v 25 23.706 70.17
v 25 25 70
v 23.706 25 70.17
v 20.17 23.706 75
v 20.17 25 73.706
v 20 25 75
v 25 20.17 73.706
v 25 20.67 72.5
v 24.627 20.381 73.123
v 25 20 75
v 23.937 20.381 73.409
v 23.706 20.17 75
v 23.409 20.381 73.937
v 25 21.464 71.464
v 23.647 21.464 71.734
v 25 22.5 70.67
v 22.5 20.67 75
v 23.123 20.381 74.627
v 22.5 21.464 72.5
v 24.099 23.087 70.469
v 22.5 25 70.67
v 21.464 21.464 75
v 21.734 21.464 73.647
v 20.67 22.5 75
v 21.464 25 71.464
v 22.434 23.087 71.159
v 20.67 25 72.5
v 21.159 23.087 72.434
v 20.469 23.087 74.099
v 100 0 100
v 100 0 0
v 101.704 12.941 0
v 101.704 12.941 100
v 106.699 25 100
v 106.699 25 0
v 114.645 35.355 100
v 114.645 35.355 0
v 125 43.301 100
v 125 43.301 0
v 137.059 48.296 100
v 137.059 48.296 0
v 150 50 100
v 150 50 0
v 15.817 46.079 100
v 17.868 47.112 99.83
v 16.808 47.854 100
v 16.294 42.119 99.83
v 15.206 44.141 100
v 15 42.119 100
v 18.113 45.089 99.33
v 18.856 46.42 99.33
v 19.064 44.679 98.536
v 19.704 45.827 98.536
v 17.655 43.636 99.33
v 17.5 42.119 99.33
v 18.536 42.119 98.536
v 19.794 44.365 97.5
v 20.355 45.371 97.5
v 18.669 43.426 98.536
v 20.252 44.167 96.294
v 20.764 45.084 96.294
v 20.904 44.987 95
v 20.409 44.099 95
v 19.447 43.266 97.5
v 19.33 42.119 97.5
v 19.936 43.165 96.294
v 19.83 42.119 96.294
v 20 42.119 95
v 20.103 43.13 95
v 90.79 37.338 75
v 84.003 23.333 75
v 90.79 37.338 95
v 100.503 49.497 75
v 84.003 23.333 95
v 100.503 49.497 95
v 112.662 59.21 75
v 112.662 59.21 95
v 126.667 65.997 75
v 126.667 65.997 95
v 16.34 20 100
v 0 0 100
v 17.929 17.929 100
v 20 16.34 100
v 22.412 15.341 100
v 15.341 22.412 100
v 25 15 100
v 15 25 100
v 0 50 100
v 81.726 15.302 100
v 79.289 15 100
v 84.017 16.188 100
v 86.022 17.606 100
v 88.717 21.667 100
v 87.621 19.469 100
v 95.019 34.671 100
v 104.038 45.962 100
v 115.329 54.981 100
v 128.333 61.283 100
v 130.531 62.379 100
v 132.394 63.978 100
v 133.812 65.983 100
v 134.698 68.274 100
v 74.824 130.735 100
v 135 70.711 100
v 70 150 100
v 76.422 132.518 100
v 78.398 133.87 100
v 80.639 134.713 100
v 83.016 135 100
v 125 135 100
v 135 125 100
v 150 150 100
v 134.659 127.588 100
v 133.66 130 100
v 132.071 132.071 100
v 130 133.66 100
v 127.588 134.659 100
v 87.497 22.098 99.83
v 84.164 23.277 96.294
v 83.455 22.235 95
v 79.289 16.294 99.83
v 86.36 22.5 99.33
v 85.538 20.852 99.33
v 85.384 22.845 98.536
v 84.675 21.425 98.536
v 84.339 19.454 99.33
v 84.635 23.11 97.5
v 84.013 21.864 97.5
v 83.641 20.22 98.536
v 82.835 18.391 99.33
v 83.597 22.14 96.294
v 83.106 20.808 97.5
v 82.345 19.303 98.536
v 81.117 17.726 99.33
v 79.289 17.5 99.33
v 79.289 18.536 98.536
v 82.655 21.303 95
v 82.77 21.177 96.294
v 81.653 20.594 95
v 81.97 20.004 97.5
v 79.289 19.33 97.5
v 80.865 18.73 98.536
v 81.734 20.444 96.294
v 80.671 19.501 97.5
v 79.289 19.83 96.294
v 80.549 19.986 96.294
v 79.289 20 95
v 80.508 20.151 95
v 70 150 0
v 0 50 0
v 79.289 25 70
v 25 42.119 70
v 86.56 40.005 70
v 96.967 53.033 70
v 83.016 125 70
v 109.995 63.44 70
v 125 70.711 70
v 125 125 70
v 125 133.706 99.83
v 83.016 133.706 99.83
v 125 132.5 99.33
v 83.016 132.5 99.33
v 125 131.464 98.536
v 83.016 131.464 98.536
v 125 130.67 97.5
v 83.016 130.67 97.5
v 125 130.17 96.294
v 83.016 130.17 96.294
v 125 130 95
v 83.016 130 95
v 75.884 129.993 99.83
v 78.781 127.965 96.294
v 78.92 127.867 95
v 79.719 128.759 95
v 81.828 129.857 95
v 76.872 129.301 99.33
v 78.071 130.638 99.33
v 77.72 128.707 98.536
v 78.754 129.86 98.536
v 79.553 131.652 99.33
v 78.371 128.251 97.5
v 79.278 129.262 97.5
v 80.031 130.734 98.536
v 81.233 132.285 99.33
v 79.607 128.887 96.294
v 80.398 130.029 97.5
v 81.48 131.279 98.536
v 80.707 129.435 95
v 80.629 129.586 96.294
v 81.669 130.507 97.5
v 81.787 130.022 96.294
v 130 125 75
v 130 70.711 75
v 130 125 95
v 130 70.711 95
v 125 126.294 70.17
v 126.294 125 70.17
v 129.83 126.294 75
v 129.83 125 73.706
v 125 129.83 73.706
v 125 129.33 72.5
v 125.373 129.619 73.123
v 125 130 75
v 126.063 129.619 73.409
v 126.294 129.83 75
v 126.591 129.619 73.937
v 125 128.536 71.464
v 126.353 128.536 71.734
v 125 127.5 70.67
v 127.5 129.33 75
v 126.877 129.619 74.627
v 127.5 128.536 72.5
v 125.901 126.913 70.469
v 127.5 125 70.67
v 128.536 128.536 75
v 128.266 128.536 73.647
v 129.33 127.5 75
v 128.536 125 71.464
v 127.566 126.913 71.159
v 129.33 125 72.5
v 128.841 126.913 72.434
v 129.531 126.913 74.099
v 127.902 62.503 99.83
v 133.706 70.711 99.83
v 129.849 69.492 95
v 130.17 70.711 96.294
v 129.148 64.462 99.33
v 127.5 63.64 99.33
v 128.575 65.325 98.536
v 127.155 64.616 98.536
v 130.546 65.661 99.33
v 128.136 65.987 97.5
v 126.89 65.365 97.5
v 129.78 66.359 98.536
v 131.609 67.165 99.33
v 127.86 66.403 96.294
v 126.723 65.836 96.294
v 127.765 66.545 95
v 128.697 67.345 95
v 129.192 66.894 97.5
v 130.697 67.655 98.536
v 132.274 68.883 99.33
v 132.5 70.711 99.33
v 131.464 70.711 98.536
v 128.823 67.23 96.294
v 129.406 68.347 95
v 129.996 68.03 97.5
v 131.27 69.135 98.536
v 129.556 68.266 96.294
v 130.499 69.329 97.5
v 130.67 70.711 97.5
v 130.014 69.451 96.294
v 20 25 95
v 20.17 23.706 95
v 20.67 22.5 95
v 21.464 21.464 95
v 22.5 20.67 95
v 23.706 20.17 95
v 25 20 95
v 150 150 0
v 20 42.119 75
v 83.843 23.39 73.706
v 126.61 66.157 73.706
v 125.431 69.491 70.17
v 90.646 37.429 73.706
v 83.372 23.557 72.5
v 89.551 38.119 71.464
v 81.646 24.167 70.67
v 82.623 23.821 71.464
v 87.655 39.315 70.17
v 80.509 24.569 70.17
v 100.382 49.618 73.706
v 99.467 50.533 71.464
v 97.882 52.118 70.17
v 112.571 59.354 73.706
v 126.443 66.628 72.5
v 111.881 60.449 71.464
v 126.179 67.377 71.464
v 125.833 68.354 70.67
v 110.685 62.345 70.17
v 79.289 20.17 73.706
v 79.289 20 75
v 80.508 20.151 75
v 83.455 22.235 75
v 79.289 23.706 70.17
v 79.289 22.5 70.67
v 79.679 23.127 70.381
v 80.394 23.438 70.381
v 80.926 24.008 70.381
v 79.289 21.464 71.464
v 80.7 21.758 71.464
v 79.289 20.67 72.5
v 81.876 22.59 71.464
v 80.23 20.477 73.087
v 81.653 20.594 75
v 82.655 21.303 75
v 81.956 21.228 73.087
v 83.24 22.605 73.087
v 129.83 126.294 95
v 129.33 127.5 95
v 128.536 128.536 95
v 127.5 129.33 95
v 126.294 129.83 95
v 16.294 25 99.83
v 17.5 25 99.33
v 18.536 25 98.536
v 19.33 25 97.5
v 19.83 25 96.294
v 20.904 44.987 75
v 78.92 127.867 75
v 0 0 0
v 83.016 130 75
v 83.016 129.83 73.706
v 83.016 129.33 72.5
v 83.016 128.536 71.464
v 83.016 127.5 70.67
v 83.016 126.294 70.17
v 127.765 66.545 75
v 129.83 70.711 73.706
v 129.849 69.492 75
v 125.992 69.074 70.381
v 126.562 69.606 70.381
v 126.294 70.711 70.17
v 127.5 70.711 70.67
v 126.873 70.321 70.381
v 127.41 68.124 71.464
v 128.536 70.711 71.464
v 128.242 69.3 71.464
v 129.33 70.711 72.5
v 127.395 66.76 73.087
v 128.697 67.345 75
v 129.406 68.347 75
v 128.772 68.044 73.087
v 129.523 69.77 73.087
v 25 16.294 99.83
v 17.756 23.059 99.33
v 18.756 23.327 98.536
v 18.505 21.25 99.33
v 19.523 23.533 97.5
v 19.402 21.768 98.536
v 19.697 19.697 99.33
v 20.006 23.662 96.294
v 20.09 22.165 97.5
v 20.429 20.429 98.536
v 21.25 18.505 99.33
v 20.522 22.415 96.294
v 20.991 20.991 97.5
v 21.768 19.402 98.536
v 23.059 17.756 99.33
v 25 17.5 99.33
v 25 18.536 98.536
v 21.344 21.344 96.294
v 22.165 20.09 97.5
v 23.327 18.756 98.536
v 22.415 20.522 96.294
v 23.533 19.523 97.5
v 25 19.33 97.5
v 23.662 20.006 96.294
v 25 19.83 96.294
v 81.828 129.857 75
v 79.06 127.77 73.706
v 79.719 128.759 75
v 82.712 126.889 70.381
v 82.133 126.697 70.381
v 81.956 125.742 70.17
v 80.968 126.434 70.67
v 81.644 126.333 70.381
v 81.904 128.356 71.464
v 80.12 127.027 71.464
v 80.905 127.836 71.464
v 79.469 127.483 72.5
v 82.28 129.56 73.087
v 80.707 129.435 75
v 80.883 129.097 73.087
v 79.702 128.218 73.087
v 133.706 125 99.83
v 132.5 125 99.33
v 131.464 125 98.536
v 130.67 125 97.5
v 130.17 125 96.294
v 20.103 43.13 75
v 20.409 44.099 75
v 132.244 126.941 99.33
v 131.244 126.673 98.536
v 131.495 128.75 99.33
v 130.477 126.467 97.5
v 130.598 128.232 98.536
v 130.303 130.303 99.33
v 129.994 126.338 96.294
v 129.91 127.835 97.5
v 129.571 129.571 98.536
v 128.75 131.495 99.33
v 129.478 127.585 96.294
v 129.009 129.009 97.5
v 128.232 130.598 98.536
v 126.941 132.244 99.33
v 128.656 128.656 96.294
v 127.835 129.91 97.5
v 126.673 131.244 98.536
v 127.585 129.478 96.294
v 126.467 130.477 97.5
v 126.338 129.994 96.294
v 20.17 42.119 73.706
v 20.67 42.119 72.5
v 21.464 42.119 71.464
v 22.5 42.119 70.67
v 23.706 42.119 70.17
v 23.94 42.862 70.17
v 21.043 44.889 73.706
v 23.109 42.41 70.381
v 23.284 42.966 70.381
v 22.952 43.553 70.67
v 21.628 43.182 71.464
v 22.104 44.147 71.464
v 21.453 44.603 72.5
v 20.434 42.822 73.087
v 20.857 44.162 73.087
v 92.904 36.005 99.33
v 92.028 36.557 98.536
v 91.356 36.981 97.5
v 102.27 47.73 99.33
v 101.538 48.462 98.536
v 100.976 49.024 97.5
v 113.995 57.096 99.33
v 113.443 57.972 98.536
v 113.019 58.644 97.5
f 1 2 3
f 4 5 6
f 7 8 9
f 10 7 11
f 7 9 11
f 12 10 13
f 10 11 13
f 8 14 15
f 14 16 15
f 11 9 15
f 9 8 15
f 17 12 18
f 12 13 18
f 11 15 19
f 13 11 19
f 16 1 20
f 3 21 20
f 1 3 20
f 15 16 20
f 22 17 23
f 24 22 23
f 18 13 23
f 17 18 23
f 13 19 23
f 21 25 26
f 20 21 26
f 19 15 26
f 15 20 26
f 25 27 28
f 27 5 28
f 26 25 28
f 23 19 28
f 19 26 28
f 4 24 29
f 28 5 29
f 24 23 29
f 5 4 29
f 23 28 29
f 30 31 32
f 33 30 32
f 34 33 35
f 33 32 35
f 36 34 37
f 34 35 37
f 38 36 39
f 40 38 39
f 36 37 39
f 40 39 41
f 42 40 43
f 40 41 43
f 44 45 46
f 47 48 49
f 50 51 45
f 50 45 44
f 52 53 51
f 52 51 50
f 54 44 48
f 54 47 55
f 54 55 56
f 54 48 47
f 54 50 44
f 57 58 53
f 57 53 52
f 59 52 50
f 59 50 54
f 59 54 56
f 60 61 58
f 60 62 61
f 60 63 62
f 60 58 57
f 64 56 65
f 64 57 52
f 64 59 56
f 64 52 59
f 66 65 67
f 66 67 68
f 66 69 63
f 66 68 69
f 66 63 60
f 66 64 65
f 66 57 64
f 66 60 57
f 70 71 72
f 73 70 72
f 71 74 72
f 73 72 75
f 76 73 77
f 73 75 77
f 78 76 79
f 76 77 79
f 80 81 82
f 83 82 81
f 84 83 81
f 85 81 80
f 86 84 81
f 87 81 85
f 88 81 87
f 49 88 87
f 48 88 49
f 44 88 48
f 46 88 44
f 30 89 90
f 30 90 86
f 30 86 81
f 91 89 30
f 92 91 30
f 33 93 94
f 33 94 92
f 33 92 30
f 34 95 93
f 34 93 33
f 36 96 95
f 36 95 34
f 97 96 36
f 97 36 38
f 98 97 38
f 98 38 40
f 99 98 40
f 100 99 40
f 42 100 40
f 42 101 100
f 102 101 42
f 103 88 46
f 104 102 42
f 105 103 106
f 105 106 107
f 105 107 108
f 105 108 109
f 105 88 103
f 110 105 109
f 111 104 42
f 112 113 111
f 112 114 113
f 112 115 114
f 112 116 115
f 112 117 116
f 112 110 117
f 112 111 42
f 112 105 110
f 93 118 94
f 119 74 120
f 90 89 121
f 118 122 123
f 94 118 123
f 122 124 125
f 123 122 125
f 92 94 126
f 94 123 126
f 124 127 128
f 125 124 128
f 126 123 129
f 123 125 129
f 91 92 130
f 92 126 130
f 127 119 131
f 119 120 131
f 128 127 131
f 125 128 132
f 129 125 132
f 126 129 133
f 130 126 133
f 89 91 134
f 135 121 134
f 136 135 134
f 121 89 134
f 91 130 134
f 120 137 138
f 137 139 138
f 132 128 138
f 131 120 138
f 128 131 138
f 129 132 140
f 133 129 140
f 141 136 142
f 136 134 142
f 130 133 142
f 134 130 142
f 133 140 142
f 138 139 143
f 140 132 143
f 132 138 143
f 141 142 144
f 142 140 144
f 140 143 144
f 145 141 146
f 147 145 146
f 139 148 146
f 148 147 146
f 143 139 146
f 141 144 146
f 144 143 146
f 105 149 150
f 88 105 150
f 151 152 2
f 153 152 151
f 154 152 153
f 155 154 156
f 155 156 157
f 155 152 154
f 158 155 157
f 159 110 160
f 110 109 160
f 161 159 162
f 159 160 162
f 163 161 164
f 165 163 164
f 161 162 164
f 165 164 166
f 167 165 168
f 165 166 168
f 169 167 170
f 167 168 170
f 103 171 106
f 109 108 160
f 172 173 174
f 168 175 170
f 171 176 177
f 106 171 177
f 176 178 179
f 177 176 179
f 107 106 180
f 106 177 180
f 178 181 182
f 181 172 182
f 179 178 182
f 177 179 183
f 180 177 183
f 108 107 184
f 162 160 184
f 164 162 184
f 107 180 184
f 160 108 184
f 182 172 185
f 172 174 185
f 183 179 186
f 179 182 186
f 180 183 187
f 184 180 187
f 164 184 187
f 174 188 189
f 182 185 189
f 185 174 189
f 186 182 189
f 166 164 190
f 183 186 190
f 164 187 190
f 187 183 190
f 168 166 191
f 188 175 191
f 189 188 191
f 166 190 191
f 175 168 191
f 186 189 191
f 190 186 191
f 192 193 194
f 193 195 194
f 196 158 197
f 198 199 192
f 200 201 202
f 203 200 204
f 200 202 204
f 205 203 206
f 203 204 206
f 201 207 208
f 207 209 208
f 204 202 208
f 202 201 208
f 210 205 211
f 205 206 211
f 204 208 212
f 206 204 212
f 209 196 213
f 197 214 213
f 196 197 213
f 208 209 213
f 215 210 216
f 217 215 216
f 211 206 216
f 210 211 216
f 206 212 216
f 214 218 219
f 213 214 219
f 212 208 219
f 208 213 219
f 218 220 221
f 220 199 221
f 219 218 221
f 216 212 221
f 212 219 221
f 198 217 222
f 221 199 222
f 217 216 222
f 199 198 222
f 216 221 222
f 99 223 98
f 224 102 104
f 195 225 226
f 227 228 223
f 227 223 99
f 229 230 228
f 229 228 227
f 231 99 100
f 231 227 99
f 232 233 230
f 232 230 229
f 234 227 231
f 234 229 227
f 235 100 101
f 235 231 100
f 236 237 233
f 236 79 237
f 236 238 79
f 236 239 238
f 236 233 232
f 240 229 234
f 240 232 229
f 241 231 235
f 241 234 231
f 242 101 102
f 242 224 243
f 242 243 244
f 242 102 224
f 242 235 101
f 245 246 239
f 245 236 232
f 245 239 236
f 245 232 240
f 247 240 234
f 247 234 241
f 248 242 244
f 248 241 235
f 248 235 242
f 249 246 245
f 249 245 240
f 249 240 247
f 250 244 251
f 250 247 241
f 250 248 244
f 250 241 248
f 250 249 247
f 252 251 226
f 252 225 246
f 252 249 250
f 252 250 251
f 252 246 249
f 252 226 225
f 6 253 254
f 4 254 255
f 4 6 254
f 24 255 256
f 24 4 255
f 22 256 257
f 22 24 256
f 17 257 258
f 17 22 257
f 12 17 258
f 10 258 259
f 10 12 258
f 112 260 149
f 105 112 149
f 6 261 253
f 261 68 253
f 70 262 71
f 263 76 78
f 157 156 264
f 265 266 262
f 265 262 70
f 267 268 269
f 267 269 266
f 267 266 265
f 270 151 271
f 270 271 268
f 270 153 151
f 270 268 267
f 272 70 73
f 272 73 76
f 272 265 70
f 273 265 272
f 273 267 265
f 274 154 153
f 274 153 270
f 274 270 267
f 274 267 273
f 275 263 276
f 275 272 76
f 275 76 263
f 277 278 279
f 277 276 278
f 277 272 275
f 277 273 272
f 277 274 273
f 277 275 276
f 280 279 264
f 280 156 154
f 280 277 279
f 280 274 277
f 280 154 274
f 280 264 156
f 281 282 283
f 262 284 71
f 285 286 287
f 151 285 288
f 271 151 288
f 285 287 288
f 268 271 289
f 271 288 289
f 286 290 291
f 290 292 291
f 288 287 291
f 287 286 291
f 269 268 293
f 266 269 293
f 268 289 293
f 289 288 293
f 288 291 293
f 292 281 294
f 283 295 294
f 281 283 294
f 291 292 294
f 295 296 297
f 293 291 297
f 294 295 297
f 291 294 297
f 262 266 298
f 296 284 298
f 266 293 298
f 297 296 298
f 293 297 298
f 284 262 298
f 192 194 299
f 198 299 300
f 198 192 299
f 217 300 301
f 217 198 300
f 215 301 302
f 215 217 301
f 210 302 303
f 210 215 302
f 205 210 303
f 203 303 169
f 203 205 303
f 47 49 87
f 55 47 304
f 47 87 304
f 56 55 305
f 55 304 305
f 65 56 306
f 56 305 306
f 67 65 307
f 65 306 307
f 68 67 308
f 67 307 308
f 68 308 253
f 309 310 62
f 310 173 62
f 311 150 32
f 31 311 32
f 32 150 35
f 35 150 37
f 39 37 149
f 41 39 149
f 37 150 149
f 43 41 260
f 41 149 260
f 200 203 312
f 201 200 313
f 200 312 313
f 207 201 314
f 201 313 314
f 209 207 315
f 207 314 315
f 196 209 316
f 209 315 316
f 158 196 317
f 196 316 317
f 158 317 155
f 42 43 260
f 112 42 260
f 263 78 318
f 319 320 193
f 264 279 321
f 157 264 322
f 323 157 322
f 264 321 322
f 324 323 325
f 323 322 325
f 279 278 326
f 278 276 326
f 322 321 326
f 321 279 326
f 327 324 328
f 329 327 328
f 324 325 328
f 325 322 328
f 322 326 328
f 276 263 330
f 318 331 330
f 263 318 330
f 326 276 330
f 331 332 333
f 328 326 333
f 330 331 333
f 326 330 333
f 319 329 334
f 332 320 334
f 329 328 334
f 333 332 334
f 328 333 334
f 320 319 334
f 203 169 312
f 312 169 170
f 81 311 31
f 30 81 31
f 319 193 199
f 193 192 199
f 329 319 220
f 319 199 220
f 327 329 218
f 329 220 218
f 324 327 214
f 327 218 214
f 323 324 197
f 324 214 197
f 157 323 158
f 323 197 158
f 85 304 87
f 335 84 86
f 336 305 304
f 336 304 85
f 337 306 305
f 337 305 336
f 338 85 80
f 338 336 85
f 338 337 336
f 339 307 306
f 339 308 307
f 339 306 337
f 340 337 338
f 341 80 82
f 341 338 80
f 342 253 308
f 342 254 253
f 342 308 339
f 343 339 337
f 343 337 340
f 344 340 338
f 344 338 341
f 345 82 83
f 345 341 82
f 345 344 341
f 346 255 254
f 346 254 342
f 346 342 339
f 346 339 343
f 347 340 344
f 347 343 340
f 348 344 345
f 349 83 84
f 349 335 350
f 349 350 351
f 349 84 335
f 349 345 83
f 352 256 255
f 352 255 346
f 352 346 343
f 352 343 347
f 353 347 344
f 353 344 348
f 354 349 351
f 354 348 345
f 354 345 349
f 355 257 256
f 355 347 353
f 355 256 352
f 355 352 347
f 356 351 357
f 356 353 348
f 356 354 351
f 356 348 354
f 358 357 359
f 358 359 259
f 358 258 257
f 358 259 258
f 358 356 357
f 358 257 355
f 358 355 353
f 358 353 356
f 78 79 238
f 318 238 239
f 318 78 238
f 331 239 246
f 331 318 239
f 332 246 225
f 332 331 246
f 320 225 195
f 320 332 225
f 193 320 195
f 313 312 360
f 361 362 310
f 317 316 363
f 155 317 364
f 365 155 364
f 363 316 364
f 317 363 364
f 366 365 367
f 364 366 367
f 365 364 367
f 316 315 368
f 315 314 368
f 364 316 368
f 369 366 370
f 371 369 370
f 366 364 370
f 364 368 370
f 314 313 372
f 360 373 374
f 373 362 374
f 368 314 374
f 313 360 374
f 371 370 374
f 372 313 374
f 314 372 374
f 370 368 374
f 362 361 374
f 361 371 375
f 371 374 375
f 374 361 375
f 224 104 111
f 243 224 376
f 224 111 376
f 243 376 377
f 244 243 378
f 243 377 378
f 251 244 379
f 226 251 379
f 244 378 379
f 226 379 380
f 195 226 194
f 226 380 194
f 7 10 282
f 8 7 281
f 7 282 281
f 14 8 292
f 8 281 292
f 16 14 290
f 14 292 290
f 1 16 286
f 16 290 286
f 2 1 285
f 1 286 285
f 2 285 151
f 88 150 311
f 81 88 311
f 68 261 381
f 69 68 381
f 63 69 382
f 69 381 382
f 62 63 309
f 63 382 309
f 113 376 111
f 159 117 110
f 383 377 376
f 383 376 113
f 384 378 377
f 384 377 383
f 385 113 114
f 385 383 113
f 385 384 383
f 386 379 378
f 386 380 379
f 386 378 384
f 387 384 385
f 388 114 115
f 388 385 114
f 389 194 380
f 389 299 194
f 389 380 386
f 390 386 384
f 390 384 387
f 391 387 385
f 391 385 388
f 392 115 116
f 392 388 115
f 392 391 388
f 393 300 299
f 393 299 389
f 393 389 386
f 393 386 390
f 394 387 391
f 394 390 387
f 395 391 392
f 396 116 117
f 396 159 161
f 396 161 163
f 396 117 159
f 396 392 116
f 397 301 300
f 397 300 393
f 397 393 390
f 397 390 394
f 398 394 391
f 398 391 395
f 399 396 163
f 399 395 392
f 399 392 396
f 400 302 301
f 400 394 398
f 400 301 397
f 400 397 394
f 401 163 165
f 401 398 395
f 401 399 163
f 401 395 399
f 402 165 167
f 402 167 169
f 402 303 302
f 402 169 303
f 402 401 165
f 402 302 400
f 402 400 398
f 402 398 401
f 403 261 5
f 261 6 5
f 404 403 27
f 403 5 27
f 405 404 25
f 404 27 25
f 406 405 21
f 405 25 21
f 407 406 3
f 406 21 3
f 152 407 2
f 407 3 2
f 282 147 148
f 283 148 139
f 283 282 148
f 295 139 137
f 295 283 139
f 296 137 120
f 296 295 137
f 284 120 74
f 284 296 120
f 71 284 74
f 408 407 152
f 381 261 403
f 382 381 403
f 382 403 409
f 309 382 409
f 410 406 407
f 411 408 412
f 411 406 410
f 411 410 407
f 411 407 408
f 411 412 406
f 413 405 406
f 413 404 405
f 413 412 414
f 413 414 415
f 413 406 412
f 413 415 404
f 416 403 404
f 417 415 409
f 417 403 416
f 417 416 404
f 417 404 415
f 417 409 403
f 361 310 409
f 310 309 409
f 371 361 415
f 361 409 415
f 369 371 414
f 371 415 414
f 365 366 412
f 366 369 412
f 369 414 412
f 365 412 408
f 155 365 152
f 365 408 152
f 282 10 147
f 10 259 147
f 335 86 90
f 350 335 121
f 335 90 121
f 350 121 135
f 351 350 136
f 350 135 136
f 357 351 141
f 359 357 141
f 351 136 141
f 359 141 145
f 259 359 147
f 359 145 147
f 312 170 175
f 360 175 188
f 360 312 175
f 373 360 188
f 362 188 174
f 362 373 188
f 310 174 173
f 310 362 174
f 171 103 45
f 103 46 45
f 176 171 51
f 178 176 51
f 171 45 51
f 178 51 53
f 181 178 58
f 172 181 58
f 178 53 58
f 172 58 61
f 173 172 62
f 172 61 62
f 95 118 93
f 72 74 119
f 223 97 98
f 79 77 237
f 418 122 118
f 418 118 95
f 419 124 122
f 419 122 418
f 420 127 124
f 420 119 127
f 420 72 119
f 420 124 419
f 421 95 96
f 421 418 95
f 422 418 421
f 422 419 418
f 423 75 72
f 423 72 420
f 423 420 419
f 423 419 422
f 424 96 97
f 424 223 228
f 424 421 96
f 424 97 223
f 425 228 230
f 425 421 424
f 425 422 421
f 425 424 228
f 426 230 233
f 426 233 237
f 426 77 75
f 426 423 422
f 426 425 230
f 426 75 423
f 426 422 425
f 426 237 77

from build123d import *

# Parameters (mm, degrees)
F1_DEPTH = 100
F3_DEPTH = 30
F4_R     = 5


with BuildPart() as f1:
    # F0 (on Top) → F1 (new body)
    with BuildSketch(Plane.XY):
        with BuildLine():
            Line((0, 50), (0, 0))
            Line((0, 0), (100, 0))
            ThreePointArc((100, 0), (114.6446609407, 35.3553390593), (150, 50))
            Line((150, 50), (150, 150))
            Line((150, 150), (70, 150))
            Line((70, 150), (0, 50))
        make_face()
    extrude(amount=F1_DEPTH)

    # F2 (on face) → F3 (cut)
    with BuildSketch(Plane.XY.offset(100)):
        with BuildLine():
            Line((20, 43.6955553836), (20, 20))
            Line((20, 20), (82.917960675, 20))
            ThreePointArc((82.917960675, 20), (100.5025253169, 49.4974746831), (130, 67.082039325))
            Line((130, 67.082039325), (130, 130))
            Line((130, 130), (80.4131112315, 130))
            Line((80.4131112315, 130), (20, 43.6955553836))
        make_face()
    extrude(amount=-F3_DEPTH, mode=Mode.SUBTRACT)

    # F4
    f4_edges = [f1.edges().sort_by_distance(p)[0] for p in [
        (20, 31.847778, 70),
        (51.45898, 20, 70),
        (100.502525, 49.497475, 70),
        (130, 98.54102, 70),
        (105.206556, 130, 70),
        (50.206556, 86.847778, 70),
        (80.413111, 130, 85),
        (20, 43.695555, 85),
        (50.206556, 86.847778, 100),
        (82.917961, 20, 85),
        (130, 67.082039, 85),
        (100.502525, 49.497475, 100),
        (20, 20, 85),
        (20, 31.847778, 100),
        (130, 130, 85),
        (130, 98.54102, 100),
        (105.206556, 130, 100),
        (51.45898, 20, 100),
    ]]
    fillet(f4_edges, radius=F4_R)


solid = f1.part
